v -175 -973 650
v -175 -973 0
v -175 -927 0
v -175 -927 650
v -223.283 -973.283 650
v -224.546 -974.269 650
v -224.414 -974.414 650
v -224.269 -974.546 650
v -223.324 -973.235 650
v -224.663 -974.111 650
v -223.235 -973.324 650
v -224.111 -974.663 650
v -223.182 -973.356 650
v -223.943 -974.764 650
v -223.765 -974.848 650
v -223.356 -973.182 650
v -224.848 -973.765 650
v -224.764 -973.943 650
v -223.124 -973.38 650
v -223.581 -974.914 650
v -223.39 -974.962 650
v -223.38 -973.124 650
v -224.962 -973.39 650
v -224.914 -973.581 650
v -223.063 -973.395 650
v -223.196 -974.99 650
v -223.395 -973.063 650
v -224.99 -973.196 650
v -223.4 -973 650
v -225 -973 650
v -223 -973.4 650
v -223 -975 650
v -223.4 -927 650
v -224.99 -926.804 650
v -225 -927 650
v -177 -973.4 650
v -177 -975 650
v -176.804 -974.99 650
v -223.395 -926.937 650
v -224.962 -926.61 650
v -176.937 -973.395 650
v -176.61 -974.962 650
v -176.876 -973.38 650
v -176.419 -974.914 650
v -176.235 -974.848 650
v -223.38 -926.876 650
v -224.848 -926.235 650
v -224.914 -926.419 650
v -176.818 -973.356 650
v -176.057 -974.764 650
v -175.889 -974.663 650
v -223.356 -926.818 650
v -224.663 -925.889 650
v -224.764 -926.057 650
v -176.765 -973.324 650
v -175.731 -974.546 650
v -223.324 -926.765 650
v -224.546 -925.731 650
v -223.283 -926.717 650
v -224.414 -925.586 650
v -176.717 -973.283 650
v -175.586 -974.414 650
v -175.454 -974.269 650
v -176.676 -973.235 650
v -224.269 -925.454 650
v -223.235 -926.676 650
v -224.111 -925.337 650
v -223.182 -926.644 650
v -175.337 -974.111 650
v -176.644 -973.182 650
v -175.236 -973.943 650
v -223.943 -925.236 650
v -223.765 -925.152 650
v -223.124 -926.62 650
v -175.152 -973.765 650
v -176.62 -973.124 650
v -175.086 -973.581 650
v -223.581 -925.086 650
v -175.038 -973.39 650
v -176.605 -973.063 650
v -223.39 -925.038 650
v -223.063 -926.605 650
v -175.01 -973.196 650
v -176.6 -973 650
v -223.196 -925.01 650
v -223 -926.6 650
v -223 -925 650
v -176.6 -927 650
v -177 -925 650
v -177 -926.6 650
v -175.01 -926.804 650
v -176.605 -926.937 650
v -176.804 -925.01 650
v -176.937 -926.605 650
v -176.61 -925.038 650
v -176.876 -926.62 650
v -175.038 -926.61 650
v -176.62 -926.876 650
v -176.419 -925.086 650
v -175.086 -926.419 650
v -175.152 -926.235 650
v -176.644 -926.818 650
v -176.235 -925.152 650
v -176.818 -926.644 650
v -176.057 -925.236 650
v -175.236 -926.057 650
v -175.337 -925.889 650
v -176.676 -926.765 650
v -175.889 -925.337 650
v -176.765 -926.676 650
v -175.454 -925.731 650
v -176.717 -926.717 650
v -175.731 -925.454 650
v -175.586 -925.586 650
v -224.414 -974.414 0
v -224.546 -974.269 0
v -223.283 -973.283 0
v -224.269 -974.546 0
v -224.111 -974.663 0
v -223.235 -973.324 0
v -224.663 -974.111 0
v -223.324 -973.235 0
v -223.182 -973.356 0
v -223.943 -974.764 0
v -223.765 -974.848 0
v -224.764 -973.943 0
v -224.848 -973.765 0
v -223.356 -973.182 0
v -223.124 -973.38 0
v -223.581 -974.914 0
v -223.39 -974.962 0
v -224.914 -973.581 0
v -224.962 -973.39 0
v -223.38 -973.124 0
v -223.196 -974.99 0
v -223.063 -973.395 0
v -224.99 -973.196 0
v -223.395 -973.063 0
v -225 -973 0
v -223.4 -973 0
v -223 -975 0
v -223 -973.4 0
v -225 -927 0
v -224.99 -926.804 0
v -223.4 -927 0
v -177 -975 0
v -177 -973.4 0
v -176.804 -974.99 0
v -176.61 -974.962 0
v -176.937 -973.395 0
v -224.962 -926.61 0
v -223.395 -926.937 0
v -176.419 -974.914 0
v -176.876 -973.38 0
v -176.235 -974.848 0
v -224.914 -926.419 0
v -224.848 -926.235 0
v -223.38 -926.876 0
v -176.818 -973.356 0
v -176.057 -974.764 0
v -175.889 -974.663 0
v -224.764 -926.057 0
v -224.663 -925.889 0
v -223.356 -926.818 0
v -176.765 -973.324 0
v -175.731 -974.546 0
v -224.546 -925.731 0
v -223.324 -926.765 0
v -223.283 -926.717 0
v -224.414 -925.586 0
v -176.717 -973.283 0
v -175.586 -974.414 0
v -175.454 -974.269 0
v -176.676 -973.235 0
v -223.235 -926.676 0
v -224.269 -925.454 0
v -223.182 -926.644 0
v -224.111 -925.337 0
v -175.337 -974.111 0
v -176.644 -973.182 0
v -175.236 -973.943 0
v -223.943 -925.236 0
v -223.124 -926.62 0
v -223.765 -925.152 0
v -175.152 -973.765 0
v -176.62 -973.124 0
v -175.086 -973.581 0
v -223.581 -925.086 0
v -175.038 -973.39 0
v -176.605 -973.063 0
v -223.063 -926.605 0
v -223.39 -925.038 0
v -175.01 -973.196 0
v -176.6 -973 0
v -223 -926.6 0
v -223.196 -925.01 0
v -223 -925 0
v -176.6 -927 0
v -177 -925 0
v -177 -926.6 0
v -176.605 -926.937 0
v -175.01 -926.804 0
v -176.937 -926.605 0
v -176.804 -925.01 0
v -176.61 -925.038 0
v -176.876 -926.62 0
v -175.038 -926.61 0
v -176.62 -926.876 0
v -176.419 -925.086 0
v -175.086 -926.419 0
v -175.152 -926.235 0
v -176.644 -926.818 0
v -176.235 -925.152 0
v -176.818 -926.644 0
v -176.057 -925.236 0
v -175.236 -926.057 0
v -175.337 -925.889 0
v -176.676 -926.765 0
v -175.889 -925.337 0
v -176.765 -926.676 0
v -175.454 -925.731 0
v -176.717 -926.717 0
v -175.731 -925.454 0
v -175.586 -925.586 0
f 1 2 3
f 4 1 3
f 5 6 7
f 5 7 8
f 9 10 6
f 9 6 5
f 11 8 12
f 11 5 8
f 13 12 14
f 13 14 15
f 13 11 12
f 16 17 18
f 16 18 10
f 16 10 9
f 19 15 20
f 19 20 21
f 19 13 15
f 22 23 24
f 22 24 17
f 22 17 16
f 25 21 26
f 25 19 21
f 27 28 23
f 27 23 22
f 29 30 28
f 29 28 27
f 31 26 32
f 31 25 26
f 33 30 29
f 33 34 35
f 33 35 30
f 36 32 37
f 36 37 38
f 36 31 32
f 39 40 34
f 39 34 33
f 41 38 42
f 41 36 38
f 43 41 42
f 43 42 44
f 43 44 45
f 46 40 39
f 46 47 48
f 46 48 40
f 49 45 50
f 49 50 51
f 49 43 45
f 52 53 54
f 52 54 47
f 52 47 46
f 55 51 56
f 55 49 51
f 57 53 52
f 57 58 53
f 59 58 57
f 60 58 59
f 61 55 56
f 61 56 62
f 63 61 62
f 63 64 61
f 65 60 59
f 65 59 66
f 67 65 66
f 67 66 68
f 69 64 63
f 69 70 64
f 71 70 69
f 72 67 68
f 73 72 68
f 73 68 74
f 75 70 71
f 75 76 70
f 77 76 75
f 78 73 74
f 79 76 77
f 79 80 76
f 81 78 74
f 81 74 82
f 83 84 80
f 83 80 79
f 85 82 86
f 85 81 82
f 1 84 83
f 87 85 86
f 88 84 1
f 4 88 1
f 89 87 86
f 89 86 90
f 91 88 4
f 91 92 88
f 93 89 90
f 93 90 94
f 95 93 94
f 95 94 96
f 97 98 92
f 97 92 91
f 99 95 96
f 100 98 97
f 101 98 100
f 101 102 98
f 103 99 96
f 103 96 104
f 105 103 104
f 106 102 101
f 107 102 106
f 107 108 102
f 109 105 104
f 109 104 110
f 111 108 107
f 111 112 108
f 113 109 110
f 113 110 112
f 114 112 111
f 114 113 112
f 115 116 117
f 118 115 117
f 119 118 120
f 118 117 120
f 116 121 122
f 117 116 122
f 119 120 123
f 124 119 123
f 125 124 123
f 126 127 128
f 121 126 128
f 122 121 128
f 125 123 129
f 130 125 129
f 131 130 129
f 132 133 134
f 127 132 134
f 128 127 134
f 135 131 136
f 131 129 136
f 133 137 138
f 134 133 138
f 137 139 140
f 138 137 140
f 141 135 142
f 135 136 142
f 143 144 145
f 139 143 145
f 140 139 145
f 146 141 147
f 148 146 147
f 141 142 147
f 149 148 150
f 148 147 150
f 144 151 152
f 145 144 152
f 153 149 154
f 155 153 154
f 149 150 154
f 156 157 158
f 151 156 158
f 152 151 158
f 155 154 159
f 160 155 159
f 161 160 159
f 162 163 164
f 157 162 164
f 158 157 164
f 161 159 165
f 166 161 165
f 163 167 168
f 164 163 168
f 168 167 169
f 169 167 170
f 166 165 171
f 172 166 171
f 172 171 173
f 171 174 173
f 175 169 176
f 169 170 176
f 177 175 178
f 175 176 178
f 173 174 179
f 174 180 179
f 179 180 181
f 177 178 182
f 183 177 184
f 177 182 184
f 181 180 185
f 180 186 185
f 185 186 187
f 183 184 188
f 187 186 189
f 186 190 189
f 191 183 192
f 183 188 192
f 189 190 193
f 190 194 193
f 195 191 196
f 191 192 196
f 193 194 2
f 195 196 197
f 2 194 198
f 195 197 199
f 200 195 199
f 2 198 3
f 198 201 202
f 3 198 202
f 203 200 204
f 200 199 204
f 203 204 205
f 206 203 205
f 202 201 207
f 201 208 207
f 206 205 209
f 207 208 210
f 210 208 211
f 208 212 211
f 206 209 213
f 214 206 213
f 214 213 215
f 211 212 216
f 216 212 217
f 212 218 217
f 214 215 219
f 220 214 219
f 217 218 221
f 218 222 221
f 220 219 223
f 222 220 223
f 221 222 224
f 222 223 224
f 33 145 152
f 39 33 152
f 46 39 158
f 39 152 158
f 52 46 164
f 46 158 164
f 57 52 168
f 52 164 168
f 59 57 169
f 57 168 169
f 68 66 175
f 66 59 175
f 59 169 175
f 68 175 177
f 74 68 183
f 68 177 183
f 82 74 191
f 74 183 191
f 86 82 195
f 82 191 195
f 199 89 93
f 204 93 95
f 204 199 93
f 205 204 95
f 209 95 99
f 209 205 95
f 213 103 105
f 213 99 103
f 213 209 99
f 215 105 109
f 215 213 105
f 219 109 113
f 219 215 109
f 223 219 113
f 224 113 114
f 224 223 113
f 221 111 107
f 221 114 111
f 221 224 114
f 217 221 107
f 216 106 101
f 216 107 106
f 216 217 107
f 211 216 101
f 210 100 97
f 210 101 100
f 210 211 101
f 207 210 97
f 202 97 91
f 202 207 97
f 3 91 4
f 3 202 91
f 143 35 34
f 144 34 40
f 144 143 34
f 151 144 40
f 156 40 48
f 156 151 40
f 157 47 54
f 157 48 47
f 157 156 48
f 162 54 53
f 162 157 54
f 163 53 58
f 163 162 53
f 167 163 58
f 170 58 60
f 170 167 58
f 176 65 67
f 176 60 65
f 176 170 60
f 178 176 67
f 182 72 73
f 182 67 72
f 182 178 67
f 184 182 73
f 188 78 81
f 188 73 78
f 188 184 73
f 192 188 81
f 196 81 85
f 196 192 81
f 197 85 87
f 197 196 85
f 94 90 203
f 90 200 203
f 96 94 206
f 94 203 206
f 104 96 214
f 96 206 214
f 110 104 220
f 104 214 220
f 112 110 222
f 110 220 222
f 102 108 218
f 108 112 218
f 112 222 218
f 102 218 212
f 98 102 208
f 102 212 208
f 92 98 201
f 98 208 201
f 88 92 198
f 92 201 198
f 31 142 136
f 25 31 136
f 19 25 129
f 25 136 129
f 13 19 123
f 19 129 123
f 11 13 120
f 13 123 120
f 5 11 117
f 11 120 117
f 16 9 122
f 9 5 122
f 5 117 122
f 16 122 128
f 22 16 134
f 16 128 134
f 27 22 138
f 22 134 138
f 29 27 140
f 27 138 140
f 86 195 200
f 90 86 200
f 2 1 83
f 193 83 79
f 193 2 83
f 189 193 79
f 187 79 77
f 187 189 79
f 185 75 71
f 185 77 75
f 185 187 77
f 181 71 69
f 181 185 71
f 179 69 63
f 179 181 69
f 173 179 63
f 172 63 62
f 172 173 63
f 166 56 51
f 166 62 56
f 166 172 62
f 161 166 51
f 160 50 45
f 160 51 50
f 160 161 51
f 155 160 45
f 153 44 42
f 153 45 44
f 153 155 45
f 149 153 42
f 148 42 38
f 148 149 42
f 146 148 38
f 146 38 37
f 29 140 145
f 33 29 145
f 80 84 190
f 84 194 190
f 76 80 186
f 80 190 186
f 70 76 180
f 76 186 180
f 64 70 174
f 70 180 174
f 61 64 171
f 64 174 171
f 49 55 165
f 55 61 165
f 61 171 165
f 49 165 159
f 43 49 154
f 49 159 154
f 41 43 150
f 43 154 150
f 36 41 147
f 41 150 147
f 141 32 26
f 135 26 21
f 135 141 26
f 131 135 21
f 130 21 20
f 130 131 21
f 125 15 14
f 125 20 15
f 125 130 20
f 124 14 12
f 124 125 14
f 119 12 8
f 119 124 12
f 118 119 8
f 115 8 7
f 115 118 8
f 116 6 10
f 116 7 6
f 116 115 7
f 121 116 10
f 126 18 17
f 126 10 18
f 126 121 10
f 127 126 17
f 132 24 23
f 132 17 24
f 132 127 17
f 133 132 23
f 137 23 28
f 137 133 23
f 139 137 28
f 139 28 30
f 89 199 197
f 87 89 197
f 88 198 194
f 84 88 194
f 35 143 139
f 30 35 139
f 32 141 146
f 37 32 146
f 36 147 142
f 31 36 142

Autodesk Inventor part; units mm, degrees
ref_plane "YZ Plane" through (0, 0, 0) normal (1, 0, 0) x (0, 1, 0)
ref_plane "XZ Plane" through (0, 0, 0) normal (0, 1, 0) x (-1, 0, 0)
ref_plane "XY Plane" through (0, 0, 0) normal (0, 0, 1) x (1, 0, 0)
ref_plane "Work Plane1" through (0, 0, 0) normal (0, 0, 1) x (1, 0, 0)
sketch "Sketch1" plane through (0, 0, 0) normal (0, 0, 1) x (1, 0, 0)
  line L0 (-250, -1000) -> (250, -1000) projected
  line L1 (250, -1000) -> (250, 1000) projected
  line L2 (250, 1000) -> (-250, 1000) projected
  line L3 (-250, 1000) -> (-250, -1000) projected
  line L4 (-223, -975) -> (-177, -975)
  line L5 (-175, -973) -> (-175, -927)
  line L6 (-177, -925) -> (-223, -925)
  line L7 (-225, -927) -> (-225, -973)
  arc A0 (-225, -973) -> (-223, -975) centre (-223, -973) ccw
  arc A1 (-223, -925) -> (-225, -927) centre (-223, -927) ccw
  arc A2 (-177, -975) -> (-175, -973) centre (-177, -973) ccw
  arc A3 (-175, -927) -> (-177, -925) centre (-177, -927) ccw
  line L8 (-223.4, -973) -> (-223.4, -927)
  arc A4 (-223, -926.6) -> (-223.4, -927) centre (-223, -927) ccw
  line L9 (-223, -926.6) -> (-177, -926.6)
  arc A5 (-176.6, -927) -> (-177, -926.6) centre (-177, -927) ccw
  line L10 (-176.6, -927) -> (-176.6, -973)
  arc A6 (-177, -973.4) -> (-176.6, -973) centre (-177, -973) ccw
  line L11 (-177, -973.4) -> (-223, -973.4)
  arc A7 (-223.4, -973) -> (-223, -973.4) centre (-223, -973) ccw
  point P0 (0, 0)
  point P1 (-175, -925)
  point P2 (-225, -925)
  dimension "d0" = 50
  dimension "d1" = 25
  dimension "d2" = 25
  dimension "d3" = 2
  dimension "d4" = 1.6
extrude "Extrusion1" add sketch "Sketch1" along normal blind 650 contours A0 L7 A1 L6 A3 L5 A2 L4
properties part number "Pata"
